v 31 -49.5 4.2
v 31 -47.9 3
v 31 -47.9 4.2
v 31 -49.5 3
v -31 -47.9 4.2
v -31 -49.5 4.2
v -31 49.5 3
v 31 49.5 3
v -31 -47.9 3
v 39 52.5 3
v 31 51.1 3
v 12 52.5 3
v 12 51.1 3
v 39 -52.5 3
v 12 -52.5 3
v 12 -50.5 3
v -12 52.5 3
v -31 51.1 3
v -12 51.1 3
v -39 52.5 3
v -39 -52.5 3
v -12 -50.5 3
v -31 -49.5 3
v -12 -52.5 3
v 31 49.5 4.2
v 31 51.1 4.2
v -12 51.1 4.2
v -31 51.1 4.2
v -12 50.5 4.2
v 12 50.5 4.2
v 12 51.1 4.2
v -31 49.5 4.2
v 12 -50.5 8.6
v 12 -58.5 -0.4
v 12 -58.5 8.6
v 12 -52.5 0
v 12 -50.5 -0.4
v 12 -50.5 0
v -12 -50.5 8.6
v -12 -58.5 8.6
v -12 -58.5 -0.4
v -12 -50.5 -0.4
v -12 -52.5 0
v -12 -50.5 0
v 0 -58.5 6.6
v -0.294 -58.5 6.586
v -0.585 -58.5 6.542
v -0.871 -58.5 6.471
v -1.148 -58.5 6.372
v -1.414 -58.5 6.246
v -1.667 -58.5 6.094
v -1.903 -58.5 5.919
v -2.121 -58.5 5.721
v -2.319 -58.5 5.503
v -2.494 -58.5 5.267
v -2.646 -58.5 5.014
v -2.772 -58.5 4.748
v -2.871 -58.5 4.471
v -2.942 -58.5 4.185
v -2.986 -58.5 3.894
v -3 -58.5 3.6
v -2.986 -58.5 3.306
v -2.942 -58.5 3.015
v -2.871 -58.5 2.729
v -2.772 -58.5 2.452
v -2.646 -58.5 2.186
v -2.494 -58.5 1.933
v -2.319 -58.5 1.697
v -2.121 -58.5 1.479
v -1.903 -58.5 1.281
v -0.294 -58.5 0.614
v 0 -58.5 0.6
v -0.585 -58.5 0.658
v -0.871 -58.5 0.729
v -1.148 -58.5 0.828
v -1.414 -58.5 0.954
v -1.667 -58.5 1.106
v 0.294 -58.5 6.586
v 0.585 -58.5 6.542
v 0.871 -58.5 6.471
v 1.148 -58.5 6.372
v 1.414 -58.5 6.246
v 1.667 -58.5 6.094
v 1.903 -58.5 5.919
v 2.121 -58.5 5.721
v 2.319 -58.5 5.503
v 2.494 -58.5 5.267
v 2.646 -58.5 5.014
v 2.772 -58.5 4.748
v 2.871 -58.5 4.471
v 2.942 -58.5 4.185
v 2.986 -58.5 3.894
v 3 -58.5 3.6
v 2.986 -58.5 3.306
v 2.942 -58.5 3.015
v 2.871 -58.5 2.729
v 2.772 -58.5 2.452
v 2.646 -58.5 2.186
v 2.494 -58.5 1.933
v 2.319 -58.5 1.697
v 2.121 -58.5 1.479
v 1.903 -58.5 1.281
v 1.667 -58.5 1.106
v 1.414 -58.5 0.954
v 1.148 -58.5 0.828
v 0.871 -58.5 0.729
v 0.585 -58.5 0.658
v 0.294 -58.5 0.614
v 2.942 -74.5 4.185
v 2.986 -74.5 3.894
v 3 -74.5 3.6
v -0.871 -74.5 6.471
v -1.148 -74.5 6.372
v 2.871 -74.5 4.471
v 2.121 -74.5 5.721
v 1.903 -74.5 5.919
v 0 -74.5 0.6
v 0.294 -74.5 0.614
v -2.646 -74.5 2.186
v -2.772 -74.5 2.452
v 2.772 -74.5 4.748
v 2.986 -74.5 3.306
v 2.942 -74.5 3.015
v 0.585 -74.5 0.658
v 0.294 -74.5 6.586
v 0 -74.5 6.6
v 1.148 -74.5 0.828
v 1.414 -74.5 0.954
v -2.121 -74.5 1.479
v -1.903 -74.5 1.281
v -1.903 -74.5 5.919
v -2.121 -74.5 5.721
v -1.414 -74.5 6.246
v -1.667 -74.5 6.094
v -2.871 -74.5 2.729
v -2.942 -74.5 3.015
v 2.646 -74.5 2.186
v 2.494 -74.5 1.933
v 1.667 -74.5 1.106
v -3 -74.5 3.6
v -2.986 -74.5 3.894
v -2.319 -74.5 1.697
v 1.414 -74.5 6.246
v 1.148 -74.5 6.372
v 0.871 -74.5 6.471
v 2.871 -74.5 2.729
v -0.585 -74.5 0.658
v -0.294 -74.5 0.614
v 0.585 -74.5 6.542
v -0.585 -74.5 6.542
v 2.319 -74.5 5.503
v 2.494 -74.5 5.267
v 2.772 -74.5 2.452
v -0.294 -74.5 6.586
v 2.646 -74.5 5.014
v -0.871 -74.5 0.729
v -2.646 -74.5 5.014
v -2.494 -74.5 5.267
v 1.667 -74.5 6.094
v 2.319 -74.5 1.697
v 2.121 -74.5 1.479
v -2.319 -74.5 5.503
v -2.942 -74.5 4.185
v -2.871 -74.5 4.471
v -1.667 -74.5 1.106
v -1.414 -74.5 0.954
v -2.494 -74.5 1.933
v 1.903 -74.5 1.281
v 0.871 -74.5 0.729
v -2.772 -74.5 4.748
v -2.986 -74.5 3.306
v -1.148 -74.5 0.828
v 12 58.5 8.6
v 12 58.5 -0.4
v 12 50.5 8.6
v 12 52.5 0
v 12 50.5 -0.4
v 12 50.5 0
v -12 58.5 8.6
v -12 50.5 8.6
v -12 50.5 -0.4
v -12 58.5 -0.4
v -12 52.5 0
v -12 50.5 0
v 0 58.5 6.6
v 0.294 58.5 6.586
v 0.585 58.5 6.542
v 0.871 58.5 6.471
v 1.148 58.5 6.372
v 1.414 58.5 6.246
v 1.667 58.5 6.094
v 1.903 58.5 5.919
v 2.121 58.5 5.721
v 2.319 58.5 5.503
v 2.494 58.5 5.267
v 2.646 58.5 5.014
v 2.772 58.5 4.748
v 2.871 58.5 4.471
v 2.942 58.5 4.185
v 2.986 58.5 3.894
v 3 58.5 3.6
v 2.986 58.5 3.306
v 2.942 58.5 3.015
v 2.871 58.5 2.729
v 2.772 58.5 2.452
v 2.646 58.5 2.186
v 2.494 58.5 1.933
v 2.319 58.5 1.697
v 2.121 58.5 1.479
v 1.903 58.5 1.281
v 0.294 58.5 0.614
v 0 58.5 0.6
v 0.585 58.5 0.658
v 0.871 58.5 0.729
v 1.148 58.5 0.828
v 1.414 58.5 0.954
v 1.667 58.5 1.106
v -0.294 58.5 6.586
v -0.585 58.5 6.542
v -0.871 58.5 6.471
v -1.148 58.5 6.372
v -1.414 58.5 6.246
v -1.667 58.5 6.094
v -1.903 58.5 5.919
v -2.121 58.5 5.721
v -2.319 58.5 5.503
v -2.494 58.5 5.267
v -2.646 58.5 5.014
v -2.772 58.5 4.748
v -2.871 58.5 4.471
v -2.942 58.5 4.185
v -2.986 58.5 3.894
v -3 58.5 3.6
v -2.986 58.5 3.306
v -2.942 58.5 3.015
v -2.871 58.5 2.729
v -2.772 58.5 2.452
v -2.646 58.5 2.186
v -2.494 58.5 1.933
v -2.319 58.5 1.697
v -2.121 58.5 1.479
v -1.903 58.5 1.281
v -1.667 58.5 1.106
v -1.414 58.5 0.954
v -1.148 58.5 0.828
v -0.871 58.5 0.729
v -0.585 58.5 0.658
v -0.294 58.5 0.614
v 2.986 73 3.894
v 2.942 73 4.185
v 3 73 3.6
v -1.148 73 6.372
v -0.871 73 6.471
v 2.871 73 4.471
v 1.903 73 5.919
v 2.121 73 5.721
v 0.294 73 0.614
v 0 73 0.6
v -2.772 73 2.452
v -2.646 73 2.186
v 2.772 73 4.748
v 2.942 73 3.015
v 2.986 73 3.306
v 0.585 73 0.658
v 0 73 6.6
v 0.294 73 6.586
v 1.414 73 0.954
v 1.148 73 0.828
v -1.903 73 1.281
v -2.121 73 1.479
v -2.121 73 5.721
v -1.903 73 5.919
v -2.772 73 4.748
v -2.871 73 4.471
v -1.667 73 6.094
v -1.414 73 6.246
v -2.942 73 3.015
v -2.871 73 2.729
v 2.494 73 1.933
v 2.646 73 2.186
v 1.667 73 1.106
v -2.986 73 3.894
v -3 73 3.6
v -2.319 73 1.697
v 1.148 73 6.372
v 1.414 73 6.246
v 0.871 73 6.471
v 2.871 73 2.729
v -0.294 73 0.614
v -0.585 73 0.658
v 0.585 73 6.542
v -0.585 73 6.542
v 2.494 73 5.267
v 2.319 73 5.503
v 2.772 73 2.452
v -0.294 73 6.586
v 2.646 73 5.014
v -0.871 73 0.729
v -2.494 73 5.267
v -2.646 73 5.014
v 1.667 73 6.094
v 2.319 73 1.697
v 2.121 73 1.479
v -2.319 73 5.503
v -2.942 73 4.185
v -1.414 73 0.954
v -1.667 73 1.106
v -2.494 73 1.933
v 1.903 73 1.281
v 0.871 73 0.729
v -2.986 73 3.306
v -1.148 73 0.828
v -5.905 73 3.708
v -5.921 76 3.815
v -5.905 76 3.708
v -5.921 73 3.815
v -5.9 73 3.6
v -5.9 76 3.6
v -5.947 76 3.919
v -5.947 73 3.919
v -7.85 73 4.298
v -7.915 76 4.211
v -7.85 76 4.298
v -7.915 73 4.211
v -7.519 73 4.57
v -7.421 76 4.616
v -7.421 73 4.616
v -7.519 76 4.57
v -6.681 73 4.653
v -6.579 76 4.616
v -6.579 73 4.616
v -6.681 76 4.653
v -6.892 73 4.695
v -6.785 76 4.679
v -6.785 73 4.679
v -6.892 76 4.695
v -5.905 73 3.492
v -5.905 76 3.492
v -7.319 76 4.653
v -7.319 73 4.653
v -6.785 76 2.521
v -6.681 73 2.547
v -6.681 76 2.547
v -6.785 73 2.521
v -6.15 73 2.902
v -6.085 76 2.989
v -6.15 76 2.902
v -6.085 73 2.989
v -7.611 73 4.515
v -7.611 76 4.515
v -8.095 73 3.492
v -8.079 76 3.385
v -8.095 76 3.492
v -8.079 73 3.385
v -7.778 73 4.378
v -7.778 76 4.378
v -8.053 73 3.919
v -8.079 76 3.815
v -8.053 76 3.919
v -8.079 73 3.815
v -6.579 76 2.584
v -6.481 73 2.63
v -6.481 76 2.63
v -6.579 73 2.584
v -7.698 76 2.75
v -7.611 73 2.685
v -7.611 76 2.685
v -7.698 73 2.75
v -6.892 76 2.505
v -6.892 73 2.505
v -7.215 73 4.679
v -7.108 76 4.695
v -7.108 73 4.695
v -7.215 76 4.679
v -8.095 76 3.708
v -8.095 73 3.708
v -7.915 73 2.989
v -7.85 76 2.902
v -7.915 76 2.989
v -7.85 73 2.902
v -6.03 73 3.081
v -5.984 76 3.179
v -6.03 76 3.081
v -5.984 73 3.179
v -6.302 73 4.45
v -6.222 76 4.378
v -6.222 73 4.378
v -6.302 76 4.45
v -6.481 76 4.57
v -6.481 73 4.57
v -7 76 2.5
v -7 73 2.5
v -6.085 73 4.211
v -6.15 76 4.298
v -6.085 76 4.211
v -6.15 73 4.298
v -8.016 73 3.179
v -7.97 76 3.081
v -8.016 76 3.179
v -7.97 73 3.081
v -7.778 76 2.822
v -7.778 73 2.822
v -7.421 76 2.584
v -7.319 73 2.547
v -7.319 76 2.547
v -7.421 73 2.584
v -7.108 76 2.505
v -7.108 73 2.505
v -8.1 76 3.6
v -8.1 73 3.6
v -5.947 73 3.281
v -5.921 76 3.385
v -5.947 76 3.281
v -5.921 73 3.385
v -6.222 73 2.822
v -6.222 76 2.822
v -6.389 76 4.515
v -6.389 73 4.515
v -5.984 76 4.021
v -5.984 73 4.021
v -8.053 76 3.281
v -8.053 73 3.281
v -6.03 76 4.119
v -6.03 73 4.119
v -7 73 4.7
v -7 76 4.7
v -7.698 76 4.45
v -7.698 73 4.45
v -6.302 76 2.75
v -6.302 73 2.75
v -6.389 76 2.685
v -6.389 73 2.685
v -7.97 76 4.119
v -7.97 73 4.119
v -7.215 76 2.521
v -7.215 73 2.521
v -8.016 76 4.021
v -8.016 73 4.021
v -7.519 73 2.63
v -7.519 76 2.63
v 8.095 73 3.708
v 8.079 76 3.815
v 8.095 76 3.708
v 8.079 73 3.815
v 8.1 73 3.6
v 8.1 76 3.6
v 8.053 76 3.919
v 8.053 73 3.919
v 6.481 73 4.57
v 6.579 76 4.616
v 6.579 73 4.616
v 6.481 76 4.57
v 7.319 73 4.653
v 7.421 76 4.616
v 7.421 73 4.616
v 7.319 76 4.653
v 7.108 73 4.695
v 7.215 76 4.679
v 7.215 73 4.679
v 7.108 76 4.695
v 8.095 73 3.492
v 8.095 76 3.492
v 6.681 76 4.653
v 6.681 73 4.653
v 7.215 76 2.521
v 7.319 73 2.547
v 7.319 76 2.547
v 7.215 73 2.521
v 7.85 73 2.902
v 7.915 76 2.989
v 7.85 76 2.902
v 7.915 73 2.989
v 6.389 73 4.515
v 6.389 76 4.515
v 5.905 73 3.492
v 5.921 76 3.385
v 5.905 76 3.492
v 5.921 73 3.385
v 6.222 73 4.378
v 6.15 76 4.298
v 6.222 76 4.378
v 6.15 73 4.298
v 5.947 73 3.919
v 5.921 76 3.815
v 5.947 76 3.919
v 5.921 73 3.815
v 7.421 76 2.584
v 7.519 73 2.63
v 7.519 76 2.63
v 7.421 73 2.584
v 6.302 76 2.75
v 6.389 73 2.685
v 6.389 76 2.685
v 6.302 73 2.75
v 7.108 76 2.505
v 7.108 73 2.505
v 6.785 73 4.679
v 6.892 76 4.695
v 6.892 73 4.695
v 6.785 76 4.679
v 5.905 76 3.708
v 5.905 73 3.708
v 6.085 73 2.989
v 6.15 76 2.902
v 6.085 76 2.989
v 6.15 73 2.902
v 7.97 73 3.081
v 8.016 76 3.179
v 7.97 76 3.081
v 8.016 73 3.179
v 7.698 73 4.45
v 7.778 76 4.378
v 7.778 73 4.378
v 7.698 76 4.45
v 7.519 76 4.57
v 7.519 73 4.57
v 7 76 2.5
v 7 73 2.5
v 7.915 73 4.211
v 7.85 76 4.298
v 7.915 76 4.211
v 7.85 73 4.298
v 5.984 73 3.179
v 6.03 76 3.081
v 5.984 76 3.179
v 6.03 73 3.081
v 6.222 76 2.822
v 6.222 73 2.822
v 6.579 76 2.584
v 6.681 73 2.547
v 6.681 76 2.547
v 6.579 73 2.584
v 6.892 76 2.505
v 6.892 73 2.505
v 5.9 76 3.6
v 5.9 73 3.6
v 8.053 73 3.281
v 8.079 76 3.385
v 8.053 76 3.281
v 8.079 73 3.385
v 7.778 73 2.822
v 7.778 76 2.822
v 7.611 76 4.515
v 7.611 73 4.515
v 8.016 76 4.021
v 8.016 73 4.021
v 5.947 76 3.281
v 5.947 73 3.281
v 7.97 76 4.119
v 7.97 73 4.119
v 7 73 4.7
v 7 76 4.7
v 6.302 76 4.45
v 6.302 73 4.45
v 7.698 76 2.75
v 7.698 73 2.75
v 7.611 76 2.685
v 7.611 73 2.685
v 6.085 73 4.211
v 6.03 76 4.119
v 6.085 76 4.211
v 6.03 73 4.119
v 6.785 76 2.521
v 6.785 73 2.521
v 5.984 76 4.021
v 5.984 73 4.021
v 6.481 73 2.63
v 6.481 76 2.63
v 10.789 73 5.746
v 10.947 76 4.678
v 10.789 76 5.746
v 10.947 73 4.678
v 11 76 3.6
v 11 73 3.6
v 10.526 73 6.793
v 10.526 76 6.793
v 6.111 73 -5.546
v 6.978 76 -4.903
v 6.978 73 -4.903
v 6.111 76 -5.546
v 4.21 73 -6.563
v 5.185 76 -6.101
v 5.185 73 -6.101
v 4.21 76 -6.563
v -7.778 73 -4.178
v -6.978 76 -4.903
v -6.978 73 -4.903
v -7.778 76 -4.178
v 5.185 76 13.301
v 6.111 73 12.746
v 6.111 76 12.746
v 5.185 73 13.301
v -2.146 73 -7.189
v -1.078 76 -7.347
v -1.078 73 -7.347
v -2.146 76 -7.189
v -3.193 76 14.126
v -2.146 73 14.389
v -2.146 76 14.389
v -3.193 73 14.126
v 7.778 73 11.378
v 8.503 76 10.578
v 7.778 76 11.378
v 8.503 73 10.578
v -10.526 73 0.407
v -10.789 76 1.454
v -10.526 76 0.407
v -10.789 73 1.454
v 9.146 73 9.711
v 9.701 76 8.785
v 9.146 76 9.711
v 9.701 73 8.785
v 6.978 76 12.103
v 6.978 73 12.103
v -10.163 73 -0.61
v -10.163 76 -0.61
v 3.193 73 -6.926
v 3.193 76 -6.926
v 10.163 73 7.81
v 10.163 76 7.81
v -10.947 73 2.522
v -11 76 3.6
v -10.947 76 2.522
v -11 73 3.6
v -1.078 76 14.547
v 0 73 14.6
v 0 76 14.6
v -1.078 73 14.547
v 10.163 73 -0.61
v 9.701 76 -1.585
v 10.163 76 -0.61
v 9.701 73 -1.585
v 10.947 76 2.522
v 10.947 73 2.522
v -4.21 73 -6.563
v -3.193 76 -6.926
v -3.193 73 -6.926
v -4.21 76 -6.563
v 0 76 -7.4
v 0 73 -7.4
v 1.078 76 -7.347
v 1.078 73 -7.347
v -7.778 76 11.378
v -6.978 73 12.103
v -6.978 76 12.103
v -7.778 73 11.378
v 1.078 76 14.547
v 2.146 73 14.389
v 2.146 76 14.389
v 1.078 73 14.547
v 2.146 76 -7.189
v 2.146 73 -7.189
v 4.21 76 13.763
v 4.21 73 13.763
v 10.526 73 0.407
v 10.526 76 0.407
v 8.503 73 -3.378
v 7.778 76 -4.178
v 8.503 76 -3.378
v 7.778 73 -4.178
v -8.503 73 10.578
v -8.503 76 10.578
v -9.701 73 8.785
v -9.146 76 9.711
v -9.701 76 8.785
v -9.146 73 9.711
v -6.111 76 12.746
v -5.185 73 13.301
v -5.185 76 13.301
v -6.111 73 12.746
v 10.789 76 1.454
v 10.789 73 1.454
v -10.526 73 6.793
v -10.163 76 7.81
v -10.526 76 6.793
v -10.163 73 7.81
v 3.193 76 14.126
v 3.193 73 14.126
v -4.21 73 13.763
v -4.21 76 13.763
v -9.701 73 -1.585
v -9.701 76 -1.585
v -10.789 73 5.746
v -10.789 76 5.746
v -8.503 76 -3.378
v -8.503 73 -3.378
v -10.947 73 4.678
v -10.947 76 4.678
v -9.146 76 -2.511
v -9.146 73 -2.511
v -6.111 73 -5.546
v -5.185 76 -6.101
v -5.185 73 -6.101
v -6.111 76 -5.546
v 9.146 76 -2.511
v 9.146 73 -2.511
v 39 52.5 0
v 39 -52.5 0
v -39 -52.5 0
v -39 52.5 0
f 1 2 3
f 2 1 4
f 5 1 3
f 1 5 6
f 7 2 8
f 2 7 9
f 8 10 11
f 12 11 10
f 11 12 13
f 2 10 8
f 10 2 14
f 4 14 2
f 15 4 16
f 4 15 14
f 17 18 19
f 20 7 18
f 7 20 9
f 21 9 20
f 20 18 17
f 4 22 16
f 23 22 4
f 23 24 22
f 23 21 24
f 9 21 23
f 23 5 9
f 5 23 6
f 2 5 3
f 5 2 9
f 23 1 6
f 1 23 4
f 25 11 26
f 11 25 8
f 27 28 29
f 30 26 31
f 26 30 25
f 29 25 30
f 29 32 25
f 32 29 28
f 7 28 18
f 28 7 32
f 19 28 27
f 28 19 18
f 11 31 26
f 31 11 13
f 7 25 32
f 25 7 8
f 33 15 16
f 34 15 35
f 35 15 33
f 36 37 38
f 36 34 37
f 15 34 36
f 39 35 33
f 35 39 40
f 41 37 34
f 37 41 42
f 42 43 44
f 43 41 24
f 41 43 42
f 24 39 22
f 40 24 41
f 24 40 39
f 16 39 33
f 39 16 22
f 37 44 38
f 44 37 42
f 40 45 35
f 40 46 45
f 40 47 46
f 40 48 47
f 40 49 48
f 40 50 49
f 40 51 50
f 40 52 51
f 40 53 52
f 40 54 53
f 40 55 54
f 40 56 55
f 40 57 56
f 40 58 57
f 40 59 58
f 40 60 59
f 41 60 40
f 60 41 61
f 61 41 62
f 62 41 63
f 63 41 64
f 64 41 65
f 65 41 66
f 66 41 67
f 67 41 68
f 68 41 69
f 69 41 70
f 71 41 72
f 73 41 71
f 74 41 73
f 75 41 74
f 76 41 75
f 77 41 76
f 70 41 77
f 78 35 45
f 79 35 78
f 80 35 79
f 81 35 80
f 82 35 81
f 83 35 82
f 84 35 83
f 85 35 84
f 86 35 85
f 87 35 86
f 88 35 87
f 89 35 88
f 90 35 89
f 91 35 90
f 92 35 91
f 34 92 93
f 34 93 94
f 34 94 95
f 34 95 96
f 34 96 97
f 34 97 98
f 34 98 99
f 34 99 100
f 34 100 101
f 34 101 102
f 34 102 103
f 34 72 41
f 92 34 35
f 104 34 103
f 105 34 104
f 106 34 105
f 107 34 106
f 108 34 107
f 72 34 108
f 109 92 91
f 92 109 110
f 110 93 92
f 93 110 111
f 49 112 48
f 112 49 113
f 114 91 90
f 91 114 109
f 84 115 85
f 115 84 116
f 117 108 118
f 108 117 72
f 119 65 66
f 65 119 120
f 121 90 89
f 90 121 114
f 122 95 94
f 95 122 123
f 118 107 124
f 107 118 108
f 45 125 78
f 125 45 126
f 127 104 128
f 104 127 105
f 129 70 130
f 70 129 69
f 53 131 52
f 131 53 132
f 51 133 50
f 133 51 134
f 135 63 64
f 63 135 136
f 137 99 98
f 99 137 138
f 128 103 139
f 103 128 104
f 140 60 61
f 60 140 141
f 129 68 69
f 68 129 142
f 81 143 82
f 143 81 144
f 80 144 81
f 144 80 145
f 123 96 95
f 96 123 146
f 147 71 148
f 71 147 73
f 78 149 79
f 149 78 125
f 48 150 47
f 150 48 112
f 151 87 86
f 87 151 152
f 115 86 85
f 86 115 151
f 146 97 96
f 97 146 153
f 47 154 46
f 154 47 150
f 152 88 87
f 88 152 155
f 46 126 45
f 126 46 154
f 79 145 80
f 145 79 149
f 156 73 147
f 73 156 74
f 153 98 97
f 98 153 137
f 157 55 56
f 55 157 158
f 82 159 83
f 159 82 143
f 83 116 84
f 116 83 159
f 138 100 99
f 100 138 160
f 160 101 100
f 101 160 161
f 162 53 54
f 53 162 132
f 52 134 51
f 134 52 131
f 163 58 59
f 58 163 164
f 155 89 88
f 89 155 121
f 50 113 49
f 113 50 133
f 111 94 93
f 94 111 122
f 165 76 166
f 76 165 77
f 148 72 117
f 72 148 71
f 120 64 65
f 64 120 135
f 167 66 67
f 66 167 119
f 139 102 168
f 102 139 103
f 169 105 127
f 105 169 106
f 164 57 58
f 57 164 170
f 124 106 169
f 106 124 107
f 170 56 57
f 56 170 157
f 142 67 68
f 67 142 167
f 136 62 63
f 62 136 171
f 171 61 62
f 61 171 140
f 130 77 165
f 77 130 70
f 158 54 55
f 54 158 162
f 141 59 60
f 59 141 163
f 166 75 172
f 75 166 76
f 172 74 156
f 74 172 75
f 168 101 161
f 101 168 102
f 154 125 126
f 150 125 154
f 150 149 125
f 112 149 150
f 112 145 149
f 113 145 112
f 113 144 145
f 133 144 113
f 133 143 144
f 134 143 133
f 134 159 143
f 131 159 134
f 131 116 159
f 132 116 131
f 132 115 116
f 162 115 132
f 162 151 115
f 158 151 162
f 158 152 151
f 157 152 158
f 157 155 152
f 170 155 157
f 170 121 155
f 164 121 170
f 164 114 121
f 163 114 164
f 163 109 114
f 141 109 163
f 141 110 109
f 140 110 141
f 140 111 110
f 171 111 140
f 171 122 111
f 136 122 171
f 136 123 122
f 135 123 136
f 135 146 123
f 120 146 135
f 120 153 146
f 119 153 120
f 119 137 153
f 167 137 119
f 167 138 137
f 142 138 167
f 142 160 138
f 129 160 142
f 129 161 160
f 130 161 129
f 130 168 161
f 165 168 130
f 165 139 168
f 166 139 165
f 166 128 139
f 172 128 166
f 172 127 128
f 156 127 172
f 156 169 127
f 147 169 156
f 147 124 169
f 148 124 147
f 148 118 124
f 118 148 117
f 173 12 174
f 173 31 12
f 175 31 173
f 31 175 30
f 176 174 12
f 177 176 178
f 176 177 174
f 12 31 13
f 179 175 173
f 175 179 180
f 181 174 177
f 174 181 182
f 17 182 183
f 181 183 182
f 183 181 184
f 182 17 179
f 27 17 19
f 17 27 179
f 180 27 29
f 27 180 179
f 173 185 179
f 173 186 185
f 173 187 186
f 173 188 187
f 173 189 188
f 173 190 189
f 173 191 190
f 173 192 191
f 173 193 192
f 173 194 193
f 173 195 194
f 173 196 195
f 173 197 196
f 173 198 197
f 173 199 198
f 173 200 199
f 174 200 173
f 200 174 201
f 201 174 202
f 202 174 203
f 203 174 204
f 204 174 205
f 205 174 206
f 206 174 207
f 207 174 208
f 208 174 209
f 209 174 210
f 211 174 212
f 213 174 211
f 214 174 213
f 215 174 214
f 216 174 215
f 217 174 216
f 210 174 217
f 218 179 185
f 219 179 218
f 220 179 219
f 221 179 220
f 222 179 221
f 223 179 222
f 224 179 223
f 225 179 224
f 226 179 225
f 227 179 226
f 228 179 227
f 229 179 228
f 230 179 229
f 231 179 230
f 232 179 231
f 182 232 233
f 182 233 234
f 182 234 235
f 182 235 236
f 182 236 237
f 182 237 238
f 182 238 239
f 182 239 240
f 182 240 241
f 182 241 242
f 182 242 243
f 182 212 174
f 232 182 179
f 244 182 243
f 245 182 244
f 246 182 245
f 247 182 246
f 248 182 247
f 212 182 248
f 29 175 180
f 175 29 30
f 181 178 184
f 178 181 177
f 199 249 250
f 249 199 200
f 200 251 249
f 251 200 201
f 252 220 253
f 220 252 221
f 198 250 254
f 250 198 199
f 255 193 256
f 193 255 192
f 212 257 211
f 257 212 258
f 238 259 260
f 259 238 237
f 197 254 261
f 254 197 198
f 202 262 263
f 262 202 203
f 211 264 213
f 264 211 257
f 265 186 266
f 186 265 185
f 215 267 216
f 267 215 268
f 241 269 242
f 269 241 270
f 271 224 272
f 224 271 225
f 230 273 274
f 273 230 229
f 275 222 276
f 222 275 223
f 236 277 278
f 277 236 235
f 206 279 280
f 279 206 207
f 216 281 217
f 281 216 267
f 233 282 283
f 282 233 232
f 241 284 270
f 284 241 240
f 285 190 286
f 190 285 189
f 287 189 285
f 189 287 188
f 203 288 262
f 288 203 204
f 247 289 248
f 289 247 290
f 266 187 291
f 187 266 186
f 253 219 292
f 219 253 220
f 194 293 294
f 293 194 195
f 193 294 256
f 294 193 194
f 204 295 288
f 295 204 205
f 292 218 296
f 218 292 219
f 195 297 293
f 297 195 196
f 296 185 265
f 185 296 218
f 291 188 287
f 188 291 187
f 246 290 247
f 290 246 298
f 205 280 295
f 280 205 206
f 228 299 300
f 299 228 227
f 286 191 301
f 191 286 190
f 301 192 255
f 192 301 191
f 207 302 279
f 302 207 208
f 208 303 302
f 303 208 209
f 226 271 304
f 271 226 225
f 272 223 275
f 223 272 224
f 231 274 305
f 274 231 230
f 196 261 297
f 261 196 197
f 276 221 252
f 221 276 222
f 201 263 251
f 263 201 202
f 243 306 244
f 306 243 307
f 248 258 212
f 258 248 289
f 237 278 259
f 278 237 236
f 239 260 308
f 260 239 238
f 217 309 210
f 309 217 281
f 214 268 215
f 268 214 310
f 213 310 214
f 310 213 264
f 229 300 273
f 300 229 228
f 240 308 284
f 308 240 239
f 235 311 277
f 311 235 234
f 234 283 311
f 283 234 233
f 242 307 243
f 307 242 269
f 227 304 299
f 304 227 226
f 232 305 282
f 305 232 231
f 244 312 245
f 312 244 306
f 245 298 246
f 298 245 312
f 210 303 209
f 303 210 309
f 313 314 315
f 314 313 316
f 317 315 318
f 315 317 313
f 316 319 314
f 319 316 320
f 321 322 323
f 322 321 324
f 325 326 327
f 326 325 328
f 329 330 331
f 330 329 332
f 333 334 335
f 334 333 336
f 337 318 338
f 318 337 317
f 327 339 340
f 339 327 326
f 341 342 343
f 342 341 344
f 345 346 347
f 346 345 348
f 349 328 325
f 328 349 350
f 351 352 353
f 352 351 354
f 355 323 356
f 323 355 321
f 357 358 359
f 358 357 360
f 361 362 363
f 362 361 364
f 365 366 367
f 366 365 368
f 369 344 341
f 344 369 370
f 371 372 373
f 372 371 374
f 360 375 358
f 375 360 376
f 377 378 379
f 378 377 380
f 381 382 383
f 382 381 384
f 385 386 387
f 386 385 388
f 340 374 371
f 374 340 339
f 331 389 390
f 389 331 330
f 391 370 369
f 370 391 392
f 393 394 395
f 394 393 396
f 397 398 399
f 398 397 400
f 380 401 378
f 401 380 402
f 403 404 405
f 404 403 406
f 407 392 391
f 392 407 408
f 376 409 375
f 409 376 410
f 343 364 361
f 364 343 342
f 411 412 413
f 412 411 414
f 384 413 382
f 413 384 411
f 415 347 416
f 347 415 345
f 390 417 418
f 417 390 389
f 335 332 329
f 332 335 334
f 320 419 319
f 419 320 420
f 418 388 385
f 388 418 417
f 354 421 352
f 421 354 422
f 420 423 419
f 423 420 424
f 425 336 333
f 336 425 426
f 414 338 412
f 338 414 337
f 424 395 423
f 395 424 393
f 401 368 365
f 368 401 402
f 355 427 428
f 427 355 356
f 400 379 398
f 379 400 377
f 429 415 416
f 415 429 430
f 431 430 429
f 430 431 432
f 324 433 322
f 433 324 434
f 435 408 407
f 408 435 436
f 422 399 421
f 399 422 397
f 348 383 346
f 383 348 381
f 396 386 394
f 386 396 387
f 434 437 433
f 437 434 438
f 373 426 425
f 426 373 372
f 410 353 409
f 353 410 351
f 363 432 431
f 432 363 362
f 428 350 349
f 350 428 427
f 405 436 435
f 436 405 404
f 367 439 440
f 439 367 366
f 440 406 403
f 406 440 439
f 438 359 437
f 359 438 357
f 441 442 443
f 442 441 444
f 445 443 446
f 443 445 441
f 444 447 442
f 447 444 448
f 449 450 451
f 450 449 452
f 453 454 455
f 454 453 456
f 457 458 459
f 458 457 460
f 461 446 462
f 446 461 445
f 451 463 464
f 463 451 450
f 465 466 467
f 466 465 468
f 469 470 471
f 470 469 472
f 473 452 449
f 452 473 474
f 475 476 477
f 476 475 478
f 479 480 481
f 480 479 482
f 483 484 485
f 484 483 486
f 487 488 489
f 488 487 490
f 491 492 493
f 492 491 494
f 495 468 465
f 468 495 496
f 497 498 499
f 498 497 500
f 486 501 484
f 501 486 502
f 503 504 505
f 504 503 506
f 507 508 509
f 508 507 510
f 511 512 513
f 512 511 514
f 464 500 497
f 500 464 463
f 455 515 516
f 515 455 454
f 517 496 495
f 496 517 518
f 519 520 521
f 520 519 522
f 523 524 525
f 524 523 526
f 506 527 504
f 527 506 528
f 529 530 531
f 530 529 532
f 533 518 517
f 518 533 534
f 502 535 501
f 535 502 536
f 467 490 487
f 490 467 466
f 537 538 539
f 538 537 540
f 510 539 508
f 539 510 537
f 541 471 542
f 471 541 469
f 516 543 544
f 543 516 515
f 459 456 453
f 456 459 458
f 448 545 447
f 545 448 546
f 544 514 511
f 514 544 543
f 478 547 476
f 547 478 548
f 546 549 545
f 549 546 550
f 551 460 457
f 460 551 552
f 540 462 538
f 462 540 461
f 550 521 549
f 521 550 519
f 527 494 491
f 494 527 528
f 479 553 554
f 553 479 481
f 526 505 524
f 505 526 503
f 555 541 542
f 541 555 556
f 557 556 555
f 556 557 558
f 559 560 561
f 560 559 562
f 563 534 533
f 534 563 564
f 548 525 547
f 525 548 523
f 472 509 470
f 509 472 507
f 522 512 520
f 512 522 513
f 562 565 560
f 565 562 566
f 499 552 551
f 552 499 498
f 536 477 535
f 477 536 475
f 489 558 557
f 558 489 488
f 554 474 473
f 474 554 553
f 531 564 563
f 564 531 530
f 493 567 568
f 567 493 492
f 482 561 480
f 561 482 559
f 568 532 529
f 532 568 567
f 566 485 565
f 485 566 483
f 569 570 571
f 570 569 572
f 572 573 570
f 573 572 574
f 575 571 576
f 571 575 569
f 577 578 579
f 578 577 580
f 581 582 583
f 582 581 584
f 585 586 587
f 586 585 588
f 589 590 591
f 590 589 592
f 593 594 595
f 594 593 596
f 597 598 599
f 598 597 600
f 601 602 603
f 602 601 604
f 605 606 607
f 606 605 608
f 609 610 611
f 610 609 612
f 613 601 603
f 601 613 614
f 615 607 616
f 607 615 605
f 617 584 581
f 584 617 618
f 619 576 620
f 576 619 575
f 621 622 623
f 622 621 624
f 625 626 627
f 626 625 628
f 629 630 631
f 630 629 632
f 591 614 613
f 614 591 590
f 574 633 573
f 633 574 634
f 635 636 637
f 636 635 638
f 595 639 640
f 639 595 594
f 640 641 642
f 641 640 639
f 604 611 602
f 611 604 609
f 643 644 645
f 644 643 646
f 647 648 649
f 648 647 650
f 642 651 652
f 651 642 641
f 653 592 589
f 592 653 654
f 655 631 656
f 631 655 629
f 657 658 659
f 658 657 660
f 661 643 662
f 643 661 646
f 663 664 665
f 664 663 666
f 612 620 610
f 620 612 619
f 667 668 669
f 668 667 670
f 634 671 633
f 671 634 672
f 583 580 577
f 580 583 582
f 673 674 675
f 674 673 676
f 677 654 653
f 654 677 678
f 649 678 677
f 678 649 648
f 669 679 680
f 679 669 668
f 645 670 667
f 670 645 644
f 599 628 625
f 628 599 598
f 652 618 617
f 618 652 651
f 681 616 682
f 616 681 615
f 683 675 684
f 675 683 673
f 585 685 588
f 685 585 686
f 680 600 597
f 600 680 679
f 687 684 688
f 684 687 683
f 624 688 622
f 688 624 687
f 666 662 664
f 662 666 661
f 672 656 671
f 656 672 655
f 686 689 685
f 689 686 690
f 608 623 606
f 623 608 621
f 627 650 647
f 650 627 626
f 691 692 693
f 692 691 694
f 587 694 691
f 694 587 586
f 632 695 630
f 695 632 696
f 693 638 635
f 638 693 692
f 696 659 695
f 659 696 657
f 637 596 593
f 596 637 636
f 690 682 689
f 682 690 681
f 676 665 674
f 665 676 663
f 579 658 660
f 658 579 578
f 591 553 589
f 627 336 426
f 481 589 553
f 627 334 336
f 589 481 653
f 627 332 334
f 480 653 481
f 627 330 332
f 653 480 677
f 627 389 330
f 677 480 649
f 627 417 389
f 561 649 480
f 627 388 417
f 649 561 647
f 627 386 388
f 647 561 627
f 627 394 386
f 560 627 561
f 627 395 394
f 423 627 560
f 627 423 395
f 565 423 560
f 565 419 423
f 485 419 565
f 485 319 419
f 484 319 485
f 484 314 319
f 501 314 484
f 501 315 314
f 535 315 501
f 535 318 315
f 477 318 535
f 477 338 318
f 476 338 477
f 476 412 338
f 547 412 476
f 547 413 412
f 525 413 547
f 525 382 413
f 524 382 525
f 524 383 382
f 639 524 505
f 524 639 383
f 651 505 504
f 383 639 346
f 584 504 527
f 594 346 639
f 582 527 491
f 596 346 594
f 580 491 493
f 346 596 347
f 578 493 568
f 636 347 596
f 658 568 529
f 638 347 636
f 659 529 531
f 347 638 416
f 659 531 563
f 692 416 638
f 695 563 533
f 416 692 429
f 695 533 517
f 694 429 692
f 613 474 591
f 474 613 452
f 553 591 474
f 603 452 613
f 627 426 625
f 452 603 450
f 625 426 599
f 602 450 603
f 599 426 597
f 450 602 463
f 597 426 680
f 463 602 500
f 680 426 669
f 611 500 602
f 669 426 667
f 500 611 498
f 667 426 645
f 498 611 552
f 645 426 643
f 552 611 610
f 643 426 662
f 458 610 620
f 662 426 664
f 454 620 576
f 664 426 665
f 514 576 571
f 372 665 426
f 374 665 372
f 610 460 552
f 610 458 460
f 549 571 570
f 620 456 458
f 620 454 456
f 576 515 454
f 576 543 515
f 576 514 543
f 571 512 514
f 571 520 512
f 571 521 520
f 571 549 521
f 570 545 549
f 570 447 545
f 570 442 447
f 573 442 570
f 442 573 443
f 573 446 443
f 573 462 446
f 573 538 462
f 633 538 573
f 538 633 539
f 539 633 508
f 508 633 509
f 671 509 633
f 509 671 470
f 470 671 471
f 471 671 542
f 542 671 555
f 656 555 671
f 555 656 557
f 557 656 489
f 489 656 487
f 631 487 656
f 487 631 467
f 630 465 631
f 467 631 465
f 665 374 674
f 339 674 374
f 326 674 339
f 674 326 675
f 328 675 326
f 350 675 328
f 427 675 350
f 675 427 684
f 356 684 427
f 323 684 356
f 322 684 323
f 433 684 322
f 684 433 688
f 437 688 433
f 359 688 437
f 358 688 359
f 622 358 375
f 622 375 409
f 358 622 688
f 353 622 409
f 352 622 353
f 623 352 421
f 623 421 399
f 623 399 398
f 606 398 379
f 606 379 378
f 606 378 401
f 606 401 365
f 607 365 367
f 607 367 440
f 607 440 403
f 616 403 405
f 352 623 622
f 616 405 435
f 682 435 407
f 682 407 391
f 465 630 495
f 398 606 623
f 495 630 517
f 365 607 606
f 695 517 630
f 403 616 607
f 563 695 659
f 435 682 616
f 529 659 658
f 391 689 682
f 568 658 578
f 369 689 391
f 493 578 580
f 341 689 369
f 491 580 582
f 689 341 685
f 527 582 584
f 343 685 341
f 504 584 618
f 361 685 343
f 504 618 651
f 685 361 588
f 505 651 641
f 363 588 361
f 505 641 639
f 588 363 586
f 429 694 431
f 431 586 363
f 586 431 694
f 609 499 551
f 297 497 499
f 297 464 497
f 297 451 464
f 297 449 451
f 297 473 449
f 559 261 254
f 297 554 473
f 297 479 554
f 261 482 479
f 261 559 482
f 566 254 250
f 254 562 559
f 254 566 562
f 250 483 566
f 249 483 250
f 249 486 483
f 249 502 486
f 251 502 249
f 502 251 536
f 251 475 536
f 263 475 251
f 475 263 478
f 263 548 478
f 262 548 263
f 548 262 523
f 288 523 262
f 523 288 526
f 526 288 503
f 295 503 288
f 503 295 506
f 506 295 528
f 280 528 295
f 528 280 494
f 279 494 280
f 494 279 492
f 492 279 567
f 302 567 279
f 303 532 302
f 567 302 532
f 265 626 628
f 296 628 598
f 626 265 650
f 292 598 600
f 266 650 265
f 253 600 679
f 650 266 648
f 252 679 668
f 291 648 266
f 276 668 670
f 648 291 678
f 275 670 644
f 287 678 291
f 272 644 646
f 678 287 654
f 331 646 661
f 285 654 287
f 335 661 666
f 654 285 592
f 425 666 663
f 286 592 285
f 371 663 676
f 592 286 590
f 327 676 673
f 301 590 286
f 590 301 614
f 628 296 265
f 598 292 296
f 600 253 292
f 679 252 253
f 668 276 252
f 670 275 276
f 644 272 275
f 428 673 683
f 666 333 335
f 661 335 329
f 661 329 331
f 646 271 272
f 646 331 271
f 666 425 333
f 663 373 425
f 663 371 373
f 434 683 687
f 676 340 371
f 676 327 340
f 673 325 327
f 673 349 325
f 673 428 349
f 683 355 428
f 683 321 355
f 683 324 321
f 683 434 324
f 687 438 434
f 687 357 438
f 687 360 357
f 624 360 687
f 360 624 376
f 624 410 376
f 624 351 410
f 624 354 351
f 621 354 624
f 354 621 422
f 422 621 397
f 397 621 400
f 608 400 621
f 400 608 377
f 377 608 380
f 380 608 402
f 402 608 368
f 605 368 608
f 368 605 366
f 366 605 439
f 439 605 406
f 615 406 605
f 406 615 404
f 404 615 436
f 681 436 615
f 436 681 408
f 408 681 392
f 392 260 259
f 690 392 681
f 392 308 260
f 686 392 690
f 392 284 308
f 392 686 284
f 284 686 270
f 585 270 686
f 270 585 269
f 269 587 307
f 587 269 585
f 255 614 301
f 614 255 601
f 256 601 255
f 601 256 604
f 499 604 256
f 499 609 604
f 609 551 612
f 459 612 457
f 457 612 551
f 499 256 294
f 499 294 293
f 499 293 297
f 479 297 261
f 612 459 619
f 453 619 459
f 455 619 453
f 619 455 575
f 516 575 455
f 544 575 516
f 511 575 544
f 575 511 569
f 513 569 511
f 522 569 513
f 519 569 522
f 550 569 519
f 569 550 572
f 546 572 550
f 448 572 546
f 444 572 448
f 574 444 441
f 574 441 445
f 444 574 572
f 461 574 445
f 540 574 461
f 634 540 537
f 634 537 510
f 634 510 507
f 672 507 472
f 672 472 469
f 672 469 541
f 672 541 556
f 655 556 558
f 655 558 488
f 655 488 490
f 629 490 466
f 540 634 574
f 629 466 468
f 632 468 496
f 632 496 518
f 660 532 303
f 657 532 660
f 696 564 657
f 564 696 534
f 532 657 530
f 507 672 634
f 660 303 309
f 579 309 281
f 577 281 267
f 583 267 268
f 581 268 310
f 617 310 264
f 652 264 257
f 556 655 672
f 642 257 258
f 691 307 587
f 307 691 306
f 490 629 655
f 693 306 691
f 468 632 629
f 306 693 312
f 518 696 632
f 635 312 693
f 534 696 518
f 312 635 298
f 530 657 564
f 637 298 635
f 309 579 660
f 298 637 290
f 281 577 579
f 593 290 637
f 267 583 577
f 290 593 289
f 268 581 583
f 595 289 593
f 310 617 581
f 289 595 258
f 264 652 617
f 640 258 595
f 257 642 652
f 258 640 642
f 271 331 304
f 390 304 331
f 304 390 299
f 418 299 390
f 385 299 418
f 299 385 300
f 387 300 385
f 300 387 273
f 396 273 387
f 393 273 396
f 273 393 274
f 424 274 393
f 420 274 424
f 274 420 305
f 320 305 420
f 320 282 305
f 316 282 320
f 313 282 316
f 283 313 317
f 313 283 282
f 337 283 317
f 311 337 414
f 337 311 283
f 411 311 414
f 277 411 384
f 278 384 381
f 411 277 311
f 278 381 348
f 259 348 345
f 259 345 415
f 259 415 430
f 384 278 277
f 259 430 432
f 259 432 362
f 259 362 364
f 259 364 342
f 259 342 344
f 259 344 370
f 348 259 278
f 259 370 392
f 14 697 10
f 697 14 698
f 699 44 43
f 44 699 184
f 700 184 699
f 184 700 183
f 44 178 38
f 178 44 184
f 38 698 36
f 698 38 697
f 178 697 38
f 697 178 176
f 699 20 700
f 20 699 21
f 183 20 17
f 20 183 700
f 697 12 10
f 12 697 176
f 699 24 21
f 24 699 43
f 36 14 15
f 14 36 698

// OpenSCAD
// Pokemon TCG sorter V1 - parametric proof-of-concept printable parts.
// Units: mm. Parts are mechanical prototypes, NOT production-validated.
// Export with: openscad -o tray.stl -D 'part="tray"' sorter_parts.scad
// Other part names: stand, bin, camera_plate.
// Print tray flat, stands on their feet, bins bottom-down.
part = "tray"; // [tray,stand,bin,camera_plate]
$fn = 64;

card_w = 63;
card_l = 88;
tray_w = 78;
tray_l = 105;
tray_t = 3;
shaft_d = 6;
shaft_l = 18;
shaft_clearance = 0.55; // increase for tight printer

module tray() {
    union() {
        // Flat scanning stage: card placed face-up, side edges OPEN for tilt release.
        translate([-tray_w/2,-tray_l/2,0])
            cube([tray_w,tray_l,tray_t]);
        // End stops only: do not obstruct front-facing printed collector number.
        for(y=[-tray_l/2+3, tray_l/2-3])
          translate([-31,y,tray_t]) cube([62,1.6,1.2]);
        // Strong end lugs, centered on lengthwise tilt axis.
        for(side=[-1,1]) {
          translate([-12,side*(tray_l/2+2)-4, -0.4])
            cube([24,8,9]);
          // Horizontal trunnion. Axis Y, at z 3.6 mm.
          translate([0,side*(tray_l/2+shaft_l/2+4),3.6])
            rotate([90,0,0]) cylinder(d=shaft_d,h=shaft_l,center=true);
        }
        // Servo horn adapter disc at +Y: drill/customize to match actual servo horn.
        translate([0,tray_l/2+shaft_l+4,3.6])
          rotate([90,0,0])
            difference(){
              cylinder(d=22,h=3,center=true);
              for(x=[-7,7]) translate([x,0,0]) cylinder(d=2.2,h=5,center=true);
            }
    }
}

// Bearing pedestal: print TWO. Place each at the opposite tray end.
// Center of through-hole is 70 mm above foot; clears 25-mm bin rims at 55° tilt.
module stand() {
    difference() {
      union() {
        translate([-25,-13,0]) cube([50,26,5]);
        translate([-13,-6,5]) cube([26,12,72]);
        // side ribs stiffen the upright
        for(x=[-13,11]) translate([x,-6,5]) cube([2,12,51]);
      }
      // 6.55 mm smooth rotational bore, oriented along Y
      translate([0,0,70]) rotate([90,0,0]) cylinder(d=shaft_d+shaft_clearance,h=18,center=true);
      // Mounting holes for M4 into wooden/acrylic base
      for(x=[-18,18]) translate([x,0,-0.5]) cylinder(d=4.3,h=6);
    }
}

// Print two, each as a soft-lined collection bin. Set on either side of tilt axis.
module bin() {
    bw=106; bl=125; bh=25; wall=2.4;
    difference() {
      translate([-bw/2,-bl/2,0]) cube([bw,bl,bh]);
      translate([-bw/2+wall,-bl/2+wall,2.6])
          cube([bw-2*wall,bl-2*wall,bh]);
    }
}

// Universal camera support plate to fasten to wood/2020 aluminum extrusion;
// mount actual camera PCB with adjustable adhesive-free adapter or printed spacer.
module camera_plate() {
    difference(){
      translate([-45,-15,0]) cube([90,30,4]);
      for(x=[-32,32]) hull(){
         translate([x,-7,-1]) cylinder(d=3.5,h=6);
         translate([x,7,-1]) cylinder(d=3.5,h=6);
      }
      // center access hole for the lens, size depends on camera casing
      translate([0,0,-1]) cylinder(d=12,h=6);
    }
}

if (part=="tray") tray();
else if (part=="stand") stand();
else if (part=="bin") bin();
else if (part=="camera_plate") camera_plate();
